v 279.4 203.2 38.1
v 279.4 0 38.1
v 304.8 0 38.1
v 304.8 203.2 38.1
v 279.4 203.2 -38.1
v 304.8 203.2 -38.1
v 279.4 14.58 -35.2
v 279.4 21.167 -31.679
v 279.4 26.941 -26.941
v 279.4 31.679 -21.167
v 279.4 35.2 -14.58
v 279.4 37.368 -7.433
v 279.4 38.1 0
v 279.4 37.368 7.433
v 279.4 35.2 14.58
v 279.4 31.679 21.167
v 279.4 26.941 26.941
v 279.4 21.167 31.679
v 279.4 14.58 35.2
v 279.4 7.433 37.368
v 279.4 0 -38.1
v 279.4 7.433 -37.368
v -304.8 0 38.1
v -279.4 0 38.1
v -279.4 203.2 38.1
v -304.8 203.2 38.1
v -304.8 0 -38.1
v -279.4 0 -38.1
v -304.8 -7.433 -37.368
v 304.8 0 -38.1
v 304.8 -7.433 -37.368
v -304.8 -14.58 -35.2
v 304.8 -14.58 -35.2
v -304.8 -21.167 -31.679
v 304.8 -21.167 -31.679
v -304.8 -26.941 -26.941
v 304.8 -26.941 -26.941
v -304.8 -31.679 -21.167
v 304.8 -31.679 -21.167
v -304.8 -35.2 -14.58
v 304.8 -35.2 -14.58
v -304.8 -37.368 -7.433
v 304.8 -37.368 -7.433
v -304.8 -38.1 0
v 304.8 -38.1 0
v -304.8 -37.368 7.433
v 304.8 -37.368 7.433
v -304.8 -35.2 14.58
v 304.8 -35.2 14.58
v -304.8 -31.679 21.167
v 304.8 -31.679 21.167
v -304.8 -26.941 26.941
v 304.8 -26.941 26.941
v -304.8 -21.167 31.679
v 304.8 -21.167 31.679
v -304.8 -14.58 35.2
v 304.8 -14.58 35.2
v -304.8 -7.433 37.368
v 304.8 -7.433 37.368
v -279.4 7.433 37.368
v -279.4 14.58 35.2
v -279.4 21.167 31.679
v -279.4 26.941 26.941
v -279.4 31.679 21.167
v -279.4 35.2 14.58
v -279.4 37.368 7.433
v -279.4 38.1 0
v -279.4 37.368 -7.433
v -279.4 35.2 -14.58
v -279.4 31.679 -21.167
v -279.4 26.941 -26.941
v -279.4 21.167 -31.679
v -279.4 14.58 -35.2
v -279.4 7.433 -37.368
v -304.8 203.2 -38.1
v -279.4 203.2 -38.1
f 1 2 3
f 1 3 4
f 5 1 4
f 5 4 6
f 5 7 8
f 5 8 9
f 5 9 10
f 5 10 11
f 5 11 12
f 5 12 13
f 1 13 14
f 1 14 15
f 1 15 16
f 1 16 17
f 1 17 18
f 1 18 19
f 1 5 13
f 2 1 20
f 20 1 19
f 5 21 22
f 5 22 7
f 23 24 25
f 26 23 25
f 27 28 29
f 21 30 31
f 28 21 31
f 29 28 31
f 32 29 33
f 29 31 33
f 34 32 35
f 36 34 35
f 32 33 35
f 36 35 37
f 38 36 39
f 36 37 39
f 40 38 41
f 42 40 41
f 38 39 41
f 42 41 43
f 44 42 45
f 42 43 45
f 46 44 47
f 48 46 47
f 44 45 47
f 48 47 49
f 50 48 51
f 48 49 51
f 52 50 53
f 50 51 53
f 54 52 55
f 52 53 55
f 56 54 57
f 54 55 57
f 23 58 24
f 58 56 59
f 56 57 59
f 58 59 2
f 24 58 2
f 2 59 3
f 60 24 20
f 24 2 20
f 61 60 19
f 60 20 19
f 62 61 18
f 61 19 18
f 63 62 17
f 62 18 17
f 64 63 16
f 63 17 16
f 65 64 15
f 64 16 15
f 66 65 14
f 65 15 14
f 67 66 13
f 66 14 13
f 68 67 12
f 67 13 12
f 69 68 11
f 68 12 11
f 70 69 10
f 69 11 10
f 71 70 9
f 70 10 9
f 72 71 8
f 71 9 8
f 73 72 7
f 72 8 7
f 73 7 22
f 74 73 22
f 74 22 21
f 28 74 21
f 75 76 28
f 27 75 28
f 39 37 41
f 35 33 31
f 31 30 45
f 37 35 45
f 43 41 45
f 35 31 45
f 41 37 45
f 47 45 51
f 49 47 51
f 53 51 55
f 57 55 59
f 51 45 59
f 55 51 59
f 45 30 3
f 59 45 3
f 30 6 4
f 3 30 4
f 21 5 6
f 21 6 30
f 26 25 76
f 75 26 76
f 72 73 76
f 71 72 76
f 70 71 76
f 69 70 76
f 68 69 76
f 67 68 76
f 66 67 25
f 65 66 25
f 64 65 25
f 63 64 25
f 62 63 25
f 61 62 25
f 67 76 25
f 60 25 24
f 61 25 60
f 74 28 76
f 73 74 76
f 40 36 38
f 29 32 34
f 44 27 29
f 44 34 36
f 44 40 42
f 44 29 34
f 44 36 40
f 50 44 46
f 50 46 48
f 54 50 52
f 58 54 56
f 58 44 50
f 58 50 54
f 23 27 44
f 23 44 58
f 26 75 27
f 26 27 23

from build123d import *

# Parameters (mm, degrees)
SKETCH2_R           = 38.1
BOSS_EXTRUDE1_DEPTH = 279.4
BOSS_EXTRUDE2_DEPTH = 25.4


with BuildPart() as part:
    # Sketch2 → Boss-Extrude1 (new body)
    with BuildSketch(Plane(origin=(0, 0, 0), x_dir=(0, 0, -1), z_dir=(1, 0, 0))):
        Circle(SKETCH2_R)
    boss_extrude1 = extrude(amount=BOSS_EXTRUDE1_DEPTH)

    # Sketch3 → Boss-Extrude2 (add)
    with BuildSketch(Plane(origin=(279.4, 0, 0), x_dir=(0, 0, -1), z_dir=(1, 0, 0))):
        with BuildLine():
            Line((-38.1, 0), (-38.1, 203.2))
            Line((-38.1, 203.2), (38.1, 203.2))
            Line((38.1, 203.2), (38.1, 0))
            ThreePointArc((38.1, 0), (0, -38.1), (-38.1, 0))
        make_face()
    boss_extrude2 = extrude(amount=BOSS_EXTRUDE2_DEPTH)

    # Mirror1: Boss-Extrude1, Boss-Extrude2 across plane
    add(boss_extrude1.mirror(Plane(origin=(0, 0, 0), x_dir=(0, 0, 1), z_dir=(1, 0, 0))))
    add(boss_extrude2.mirror(Plane(origin=(0, 0, 0), x_dir=(0, 0, 1), z_dir=(1, 0, 0))))


solid = part.part
